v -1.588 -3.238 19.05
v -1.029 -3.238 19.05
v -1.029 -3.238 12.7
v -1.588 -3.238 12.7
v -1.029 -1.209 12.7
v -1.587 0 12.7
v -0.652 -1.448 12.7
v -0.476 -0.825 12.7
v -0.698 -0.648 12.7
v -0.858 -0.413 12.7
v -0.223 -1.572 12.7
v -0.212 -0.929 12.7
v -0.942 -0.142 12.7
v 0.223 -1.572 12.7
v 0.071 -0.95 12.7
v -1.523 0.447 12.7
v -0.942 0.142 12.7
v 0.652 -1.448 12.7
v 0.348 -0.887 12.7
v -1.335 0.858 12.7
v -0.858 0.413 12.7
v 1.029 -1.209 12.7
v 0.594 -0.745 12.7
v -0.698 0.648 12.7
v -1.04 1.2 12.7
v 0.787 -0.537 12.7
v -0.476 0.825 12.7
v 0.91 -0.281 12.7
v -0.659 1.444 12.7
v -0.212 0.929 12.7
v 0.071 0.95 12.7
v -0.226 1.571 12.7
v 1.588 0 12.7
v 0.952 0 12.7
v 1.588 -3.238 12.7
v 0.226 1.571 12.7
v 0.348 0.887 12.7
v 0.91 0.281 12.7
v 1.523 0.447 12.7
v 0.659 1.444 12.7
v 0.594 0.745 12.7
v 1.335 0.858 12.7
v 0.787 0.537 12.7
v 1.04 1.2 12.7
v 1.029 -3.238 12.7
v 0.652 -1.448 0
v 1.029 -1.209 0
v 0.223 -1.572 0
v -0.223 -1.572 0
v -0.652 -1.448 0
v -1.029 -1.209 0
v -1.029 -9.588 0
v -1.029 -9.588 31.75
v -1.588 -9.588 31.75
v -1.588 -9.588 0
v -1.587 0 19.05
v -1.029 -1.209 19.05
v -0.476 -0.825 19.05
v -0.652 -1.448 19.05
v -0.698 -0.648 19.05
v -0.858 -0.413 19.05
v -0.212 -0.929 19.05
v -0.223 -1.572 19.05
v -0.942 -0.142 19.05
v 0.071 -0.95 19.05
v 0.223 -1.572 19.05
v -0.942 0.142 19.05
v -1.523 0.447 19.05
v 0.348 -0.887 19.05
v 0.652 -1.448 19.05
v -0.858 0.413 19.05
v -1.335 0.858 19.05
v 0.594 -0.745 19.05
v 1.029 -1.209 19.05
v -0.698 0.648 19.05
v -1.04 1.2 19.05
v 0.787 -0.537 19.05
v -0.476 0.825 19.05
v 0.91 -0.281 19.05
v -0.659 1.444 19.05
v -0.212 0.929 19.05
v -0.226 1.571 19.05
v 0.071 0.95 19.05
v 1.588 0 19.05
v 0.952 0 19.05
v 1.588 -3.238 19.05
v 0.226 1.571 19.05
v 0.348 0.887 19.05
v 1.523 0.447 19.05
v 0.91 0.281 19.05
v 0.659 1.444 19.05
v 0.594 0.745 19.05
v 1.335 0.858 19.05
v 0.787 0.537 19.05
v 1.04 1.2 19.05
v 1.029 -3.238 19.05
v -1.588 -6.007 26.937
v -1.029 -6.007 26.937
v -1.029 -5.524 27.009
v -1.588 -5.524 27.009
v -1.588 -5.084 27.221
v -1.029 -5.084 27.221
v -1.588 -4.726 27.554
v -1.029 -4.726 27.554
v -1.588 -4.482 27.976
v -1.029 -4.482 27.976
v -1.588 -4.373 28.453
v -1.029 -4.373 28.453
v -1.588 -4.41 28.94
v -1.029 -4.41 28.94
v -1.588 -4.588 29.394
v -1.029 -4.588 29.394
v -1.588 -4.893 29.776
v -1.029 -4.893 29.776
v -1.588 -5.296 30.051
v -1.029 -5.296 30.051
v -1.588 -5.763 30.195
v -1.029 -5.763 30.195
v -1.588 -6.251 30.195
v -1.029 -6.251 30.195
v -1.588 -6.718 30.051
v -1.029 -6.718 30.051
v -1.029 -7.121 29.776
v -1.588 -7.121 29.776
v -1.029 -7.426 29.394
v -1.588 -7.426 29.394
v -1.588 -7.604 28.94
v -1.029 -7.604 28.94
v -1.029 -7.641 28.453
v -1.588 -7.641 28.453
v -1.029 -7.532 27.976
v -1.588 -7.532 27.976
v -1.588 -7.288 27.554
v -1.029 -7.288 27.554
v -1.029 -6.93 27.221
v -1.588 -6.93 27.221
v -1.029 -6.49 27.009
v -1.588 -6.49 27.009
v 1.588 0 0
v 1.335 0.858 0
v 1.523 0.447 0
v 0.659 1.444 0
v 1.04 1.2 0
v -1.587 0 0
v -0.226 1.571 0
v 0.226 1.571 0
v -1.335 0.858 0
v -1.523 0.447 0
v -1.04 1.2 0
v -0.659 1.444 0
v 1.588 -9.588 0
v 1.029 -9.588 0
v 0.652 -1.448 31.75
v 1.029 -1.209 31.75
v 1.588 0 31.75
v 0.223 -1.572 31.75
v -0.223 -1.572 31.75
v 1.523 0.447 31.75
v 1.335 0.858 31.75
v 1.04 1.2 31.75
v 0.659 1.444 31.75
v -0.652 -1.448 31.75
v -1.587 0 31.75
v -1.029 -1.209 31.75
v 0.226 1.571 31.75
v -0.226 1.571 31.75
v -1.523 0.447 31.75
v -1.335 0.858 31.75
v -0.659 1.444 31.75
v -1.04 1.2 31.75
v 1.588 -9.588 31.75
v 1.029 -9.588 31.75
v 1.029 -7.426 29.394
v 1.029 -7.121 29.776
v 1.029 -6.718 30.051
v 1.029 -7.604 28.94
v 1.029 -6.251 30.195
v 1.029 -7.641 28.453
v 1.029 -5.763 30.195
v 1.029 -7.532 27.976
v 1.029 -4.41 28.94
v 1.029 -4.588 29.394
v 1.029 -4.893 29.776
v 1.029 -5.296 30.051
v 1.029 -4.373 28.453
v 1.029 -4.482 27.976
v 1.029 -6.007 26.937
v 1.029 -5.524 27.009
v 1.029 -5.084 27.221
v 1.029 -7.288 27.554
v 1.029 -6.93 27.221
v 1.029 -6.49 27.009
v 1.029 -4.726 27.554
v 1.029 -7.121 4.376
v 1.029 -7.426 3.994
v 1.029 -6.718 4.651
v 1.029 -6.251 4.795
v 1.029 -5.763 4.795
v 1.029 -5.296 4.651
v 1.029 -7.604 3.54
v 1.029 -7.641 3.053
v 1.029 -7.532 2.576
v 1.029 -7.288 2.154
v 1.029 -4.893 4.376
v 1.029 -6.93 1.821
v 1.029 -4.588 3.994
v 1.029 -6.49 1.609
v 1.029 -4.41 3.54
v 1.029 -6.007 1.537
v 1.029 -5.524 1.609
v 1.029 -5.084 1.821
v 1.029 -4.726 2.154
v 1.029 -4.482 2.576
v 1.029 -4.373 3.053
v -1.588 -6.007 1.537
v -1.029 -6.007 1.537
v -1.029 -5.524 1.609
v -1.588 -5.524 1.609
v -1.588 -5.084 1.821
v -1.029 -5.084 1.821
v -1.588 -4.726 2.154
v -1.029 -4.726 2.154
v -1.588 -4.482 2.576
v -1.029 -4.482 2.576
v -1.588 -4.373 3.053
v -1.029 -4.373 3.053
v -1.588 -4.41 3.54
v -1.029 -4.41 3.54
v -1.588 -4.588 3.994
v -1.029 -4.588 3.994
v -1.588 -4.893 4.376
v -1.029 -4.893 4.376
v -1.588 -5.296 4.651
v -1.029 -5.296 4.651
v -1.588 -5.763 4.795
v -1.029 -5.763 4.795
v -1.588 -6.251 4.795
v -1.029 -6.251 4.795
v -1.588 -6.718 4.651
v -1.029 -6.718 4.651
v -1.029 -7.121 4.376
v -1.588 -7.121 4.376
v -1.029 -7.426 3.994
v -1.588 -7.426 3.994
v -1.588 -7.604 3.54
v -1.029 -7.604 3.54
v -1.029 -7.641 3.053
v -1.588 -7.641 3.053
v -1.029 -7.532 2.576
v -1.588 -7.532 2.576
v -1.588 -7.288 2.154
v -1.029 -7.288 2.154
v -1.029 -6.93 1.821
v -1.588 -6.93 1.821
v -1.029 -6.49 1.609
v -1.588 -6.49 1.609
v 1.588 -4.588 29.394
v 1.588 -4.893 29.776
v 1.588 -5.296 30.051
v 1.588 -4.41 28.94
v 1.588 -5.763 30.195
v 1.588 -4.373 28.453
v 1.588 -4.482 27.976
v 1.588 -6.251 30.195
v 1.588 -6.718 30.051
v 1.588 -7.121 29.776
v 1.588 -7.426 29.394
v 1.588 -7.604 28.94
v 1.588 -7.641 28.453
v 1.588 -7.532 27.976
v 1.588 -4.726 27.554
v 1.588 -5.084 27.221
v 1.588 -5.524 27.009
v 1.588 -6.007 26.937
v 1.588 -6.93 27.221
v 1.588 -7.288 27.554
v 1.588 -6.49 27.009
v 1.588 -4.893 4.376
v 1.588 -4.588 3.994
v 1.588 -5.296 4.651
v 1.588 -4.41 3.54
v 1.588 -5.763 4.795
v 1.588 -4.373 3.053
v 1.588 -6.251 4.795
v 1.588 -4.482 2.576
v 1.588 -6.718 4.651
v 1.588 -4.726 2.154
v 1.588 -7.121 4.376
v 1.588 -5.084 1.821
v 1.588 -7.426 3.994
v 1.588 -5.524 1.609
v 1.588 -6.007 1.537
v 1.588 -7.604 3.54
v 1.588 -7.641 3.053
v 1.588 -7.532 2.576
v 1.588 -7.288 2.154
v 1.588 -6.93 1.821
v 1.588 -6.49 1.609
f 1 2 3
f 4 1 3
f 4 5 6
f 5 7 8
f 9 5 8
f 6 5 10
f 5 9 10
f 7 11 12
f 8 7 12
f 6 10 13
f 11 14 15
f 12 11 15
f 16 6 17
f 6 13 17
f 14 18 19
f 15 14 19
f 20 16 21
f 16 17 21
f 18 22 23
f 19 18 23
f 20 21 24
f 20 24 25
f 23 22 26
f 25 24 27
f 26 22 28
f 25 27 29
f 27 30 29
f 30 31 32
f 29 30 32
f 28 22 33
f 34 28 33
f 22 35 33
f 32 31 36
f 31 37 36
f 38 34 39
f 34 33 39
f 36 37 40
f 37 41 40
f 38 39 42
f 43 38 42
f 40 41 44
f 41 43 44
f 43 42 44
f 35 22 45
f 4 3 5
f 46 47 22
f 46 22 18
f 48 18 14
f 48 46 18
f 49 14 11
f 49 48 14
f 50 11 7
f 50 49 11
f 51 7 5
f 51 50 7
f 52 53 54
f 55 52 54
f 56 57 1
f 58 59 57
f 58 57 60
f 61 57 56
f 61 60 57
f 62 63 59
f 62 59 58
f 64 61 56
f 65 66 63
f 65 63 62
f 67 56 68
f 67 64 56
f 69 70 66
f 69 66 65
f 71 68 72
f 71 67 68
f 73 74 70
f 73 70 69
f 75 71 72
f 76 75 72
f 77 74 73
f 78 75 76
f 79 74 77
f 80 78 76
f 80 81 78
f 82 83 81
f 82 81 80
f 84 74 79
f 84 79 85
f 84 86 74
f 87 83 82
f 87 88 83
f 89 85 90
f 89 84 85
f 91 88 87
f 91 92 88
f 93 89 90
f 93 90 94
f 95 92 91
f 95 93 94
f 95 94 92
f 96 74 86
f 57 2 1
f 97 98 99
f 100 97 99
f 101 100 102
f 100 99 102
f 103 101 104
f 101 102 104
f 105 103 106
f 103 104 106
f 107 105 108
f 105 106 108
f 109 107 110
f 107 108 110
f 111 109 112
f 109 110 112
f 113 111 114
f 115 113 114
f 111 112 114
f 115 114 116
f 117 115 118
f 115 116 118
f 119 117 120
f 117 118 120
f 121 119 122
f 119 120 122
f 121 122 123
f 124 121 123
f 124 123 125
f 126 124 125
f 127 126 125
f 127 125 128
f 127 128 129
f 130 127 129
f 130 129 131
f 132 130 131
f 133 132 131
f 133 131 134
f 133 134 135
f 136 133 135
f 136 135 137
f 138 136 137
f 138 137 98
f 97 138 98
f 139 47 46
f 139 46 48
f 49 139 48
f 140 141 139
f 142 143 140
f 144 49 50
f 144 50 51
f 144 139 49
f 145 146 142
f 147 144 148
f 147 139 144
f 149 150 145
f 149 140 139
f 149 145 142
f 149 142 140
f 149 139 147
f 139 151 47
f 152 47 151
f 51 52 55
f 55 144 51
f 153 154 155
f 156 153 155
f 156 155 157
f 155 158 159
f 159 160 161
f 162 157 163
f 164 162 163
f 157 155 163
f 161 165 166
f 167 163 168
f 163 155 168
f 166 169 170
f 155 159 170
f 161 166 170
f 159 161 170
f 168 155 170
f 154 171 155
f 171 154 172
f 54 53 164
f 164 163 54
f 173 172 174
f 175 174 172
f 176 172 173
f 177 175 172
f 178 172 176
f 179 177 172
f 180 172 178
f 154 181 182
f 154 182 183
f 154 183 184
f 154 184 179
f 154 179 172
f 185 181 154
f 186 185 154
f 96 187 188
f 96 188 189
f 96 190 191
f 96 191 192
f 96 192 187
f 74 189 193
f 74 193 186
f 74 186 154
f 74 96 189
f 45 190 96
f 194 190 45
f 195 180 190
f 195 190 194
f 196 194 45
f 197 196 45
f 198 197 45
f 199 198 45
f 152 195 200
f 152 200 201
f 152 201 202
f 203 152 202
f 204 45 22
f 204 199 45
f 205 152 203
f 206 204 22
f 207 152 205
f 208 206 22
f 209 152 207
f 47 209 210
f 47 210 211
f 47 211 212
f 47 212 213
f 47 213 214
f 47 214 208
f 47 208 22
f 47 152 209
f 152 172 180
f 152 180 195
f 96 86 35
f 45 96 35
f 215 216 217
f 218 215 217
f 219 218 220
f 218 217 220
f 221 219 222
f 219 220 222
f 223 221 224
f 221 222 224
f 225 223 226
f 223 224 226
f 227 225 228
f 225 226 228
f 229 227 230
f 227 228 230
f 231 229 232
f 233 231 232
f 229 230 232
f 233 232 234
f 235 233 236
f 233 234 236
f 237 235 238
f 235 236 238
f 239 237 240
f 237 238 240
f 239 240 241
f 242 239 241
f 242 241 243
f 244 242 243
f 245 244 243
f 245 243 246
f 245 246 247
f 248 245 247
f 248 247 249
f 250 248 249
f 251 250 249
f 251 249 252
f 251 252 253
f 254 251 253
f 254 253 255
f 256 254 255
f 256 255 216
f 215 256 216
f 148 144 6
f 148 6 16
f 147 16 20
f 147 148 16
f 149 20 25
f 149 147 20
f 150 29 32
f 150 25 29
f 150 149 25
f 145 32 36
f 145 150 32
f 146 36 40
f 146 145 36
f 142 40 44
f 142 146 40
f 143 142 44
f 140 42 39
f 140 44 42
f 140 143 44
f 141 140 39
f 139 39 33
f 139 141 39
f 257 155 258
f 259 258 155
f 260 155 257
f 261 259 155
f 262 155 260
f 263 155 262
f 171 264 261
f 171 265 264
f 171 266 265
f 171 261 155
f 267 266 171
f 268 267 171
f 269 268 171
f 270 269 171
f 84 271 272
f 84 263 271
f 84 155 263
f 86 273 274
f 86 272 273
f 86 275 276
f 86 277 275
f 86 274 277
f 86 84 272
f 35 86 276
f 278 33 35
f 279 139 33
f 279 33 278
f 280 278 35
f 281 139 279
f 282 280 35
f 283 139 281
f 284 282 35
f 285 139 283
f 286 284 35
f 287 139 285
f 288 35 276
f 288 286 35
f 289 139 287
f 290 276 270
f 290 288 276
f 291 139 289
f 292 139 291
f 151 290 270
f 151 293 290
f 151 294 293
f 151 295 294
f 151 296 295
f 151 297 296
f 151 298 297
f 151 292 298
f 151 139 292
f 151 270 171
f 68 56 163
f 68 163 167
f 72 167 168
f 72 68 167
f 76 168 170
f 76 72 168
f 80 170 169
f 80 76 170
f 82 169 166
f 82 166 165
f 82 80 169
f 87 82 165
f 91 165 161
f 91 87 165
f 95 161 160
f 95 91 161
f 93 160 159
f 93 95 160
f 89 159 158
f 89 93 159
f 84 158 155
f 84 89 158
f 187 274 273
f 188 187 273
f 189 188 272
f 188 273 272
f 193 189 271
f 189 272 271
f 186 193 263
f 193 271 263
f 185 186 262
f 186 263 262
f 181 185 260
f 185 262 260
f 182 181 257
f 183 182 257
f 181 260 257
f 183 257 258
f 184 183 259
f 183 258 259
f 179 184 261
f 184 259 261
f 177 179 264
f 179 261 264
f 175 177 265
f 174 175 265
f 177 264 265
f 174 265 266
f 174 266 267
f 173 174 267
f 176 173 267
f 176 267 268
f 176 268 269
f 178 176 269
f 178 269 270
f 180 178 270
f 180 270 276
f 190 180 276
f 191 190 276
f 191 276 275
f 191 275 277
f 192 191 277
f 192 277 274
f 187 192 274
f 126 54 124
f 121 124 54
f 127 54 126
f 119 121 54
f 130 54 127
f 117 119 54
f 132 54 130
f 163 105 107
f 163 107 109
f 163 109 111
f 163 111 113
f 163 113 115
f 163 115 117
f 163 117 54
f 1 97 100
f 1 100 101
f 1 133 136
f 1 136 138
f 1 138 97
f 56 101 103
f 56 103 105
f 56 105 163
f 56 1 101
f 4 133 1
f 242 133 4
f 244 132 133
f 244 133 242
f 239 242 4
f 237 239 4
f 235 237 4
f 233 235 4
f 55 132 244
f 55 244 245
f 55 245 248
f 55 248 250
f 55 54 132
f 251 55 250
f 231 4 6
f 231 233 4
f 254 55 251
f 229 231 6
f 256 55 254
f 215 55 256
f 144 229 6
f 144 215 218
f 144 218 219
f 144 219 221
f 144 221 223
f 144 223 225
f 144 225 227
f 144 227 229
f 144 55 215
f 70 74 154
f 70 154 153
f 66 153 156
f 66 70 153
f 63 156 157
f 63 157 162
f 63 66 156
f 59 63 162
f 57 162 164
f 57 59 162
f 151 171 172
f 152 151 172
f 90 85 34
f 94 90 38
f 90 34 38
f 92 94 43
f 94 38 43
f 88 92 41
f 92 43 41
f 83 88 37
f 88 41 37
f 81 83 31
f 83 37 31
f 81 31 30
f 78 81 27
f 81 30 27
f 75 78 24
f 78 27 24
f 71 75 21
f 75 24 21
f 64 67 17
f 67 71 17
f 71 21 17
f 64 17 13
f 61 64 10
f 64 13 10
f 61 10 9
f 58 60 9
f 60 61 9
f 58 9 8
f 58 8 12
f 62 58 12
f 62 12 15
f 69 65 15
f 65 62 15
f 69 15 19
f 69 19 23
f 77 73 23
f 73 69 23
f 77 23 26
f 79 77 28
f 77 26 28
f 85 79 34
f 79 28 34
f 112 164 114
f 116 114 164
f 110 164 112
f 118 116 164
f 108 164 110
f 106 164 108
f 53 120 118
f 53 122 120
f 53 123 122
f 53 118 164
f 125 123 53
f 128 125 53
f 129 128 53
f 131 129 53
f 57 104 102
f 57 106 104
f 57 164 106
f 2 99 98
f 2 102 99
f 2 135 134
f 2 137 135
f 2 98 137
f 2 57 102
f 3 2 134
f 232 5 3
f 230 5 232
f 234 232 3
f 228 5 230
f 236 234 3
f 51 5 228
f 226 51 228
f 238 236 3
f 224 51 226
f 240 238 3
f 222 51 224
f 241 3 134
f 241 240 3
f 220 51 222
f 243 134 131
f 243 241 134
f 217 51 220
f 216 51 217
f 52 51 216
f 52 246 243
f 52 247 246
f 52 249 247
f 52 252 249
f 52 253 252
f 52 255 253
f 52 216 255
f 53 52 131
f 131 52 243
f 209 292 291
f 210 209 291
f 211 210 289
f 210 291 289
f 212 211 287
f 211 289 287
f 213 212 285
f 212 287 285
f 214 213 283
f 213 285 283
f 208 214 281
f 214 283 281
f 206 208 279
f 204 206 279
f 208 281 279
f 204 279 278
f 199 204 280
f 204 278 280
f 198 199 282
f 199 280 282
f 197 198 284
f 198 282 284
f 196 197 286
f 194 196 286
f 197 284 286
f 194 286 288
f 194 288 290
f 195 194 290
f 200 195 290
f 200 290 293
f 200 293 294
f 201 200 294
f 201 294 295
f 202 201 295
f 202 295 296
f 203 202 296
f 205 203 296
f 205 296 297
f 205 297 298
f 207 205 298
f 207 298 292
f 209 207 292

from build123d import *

# Parameters (mm, degrees)
BOSS_EXTRUDE1_DEPTH = 31.75
SKETCH2_R           = 1.6383
SKETCH2_W           = 6.35
SKETCH2_H           = 4.826
CUT_EXTRUDE1_DEPTH  = 4.175
BOSS_EXTRUDE2_REACH = 21.05
SKETCH3_R           = 0.9525


with BuildPart() as part:
    # Sketch1 → Boss-Extrude1 (new body)
    with BuildSketch(Plane.XY):
        with BuildLine():
            Line((1.5875, 0), (1.5875, -9.5885))
            Line((1.5875, -9.5885), (1.0287, -9.5885))
            Line((1.0287, -9.5885), (1.0287, -1.209104032))
            ThreePointArc((1.0287, -1.209104032), (0, -1.5875), (-1.0287, -1.209104032))
            Line((-1.0287, -1.209104032), (-1.0287, -9.5885))
            Line((-1.0287, -9.5885), (-1.5875, -9.5885))
            Line((-1.5875, -9.5885), (-1.5875, 0))
            ThreePointArc((-1.5875, 0), (0, 1.5875), (1.5875, 0))
        make_face()
    extrude(amount=BOSS_EXTRUDE1_DEPTH)

    # Sketch2 → Cut-Extrude1 (cut, through all)
    with BuildSketch(Plane(origin=(1.5875, 0, 0), x_dir=(0, 0, -1), z_dir=(1, 0, 0))):
        with Locations((-28.575, -6.0071)):
            Circle(SKETCH2_R)
        with Locations((-3.175, -6.0071)):
            Circle(SKETCH2_R)
        with Locations((-15.875, -0.8255)):
            Rectangle(SKETCH2_W, SKETCH2_H)
    extrude(amount=-CUT_EXTRUDE1_DEPTH, mode=Mode.SUBTRACT)

    # Sketch3 → Boss-Extrude2 (add, up to next)
    with BuildSketch(Plane.XY.offset(12.7), mode=Mode.PRIVATE) as boss_extrude2_sk1:
        Circle(SKETCH3_R)
    boss_extrude2_tool1 = extrude(boss_extrude2_sk1.sketch, amount=BOSS_EXTRUDE2_REACH, mode=Mode.PRIVATE) - part.part
    add(boss_extrude2_tool1.solids().sort_by_distance((0, 0, 12.7))[0])


solid = part.part
